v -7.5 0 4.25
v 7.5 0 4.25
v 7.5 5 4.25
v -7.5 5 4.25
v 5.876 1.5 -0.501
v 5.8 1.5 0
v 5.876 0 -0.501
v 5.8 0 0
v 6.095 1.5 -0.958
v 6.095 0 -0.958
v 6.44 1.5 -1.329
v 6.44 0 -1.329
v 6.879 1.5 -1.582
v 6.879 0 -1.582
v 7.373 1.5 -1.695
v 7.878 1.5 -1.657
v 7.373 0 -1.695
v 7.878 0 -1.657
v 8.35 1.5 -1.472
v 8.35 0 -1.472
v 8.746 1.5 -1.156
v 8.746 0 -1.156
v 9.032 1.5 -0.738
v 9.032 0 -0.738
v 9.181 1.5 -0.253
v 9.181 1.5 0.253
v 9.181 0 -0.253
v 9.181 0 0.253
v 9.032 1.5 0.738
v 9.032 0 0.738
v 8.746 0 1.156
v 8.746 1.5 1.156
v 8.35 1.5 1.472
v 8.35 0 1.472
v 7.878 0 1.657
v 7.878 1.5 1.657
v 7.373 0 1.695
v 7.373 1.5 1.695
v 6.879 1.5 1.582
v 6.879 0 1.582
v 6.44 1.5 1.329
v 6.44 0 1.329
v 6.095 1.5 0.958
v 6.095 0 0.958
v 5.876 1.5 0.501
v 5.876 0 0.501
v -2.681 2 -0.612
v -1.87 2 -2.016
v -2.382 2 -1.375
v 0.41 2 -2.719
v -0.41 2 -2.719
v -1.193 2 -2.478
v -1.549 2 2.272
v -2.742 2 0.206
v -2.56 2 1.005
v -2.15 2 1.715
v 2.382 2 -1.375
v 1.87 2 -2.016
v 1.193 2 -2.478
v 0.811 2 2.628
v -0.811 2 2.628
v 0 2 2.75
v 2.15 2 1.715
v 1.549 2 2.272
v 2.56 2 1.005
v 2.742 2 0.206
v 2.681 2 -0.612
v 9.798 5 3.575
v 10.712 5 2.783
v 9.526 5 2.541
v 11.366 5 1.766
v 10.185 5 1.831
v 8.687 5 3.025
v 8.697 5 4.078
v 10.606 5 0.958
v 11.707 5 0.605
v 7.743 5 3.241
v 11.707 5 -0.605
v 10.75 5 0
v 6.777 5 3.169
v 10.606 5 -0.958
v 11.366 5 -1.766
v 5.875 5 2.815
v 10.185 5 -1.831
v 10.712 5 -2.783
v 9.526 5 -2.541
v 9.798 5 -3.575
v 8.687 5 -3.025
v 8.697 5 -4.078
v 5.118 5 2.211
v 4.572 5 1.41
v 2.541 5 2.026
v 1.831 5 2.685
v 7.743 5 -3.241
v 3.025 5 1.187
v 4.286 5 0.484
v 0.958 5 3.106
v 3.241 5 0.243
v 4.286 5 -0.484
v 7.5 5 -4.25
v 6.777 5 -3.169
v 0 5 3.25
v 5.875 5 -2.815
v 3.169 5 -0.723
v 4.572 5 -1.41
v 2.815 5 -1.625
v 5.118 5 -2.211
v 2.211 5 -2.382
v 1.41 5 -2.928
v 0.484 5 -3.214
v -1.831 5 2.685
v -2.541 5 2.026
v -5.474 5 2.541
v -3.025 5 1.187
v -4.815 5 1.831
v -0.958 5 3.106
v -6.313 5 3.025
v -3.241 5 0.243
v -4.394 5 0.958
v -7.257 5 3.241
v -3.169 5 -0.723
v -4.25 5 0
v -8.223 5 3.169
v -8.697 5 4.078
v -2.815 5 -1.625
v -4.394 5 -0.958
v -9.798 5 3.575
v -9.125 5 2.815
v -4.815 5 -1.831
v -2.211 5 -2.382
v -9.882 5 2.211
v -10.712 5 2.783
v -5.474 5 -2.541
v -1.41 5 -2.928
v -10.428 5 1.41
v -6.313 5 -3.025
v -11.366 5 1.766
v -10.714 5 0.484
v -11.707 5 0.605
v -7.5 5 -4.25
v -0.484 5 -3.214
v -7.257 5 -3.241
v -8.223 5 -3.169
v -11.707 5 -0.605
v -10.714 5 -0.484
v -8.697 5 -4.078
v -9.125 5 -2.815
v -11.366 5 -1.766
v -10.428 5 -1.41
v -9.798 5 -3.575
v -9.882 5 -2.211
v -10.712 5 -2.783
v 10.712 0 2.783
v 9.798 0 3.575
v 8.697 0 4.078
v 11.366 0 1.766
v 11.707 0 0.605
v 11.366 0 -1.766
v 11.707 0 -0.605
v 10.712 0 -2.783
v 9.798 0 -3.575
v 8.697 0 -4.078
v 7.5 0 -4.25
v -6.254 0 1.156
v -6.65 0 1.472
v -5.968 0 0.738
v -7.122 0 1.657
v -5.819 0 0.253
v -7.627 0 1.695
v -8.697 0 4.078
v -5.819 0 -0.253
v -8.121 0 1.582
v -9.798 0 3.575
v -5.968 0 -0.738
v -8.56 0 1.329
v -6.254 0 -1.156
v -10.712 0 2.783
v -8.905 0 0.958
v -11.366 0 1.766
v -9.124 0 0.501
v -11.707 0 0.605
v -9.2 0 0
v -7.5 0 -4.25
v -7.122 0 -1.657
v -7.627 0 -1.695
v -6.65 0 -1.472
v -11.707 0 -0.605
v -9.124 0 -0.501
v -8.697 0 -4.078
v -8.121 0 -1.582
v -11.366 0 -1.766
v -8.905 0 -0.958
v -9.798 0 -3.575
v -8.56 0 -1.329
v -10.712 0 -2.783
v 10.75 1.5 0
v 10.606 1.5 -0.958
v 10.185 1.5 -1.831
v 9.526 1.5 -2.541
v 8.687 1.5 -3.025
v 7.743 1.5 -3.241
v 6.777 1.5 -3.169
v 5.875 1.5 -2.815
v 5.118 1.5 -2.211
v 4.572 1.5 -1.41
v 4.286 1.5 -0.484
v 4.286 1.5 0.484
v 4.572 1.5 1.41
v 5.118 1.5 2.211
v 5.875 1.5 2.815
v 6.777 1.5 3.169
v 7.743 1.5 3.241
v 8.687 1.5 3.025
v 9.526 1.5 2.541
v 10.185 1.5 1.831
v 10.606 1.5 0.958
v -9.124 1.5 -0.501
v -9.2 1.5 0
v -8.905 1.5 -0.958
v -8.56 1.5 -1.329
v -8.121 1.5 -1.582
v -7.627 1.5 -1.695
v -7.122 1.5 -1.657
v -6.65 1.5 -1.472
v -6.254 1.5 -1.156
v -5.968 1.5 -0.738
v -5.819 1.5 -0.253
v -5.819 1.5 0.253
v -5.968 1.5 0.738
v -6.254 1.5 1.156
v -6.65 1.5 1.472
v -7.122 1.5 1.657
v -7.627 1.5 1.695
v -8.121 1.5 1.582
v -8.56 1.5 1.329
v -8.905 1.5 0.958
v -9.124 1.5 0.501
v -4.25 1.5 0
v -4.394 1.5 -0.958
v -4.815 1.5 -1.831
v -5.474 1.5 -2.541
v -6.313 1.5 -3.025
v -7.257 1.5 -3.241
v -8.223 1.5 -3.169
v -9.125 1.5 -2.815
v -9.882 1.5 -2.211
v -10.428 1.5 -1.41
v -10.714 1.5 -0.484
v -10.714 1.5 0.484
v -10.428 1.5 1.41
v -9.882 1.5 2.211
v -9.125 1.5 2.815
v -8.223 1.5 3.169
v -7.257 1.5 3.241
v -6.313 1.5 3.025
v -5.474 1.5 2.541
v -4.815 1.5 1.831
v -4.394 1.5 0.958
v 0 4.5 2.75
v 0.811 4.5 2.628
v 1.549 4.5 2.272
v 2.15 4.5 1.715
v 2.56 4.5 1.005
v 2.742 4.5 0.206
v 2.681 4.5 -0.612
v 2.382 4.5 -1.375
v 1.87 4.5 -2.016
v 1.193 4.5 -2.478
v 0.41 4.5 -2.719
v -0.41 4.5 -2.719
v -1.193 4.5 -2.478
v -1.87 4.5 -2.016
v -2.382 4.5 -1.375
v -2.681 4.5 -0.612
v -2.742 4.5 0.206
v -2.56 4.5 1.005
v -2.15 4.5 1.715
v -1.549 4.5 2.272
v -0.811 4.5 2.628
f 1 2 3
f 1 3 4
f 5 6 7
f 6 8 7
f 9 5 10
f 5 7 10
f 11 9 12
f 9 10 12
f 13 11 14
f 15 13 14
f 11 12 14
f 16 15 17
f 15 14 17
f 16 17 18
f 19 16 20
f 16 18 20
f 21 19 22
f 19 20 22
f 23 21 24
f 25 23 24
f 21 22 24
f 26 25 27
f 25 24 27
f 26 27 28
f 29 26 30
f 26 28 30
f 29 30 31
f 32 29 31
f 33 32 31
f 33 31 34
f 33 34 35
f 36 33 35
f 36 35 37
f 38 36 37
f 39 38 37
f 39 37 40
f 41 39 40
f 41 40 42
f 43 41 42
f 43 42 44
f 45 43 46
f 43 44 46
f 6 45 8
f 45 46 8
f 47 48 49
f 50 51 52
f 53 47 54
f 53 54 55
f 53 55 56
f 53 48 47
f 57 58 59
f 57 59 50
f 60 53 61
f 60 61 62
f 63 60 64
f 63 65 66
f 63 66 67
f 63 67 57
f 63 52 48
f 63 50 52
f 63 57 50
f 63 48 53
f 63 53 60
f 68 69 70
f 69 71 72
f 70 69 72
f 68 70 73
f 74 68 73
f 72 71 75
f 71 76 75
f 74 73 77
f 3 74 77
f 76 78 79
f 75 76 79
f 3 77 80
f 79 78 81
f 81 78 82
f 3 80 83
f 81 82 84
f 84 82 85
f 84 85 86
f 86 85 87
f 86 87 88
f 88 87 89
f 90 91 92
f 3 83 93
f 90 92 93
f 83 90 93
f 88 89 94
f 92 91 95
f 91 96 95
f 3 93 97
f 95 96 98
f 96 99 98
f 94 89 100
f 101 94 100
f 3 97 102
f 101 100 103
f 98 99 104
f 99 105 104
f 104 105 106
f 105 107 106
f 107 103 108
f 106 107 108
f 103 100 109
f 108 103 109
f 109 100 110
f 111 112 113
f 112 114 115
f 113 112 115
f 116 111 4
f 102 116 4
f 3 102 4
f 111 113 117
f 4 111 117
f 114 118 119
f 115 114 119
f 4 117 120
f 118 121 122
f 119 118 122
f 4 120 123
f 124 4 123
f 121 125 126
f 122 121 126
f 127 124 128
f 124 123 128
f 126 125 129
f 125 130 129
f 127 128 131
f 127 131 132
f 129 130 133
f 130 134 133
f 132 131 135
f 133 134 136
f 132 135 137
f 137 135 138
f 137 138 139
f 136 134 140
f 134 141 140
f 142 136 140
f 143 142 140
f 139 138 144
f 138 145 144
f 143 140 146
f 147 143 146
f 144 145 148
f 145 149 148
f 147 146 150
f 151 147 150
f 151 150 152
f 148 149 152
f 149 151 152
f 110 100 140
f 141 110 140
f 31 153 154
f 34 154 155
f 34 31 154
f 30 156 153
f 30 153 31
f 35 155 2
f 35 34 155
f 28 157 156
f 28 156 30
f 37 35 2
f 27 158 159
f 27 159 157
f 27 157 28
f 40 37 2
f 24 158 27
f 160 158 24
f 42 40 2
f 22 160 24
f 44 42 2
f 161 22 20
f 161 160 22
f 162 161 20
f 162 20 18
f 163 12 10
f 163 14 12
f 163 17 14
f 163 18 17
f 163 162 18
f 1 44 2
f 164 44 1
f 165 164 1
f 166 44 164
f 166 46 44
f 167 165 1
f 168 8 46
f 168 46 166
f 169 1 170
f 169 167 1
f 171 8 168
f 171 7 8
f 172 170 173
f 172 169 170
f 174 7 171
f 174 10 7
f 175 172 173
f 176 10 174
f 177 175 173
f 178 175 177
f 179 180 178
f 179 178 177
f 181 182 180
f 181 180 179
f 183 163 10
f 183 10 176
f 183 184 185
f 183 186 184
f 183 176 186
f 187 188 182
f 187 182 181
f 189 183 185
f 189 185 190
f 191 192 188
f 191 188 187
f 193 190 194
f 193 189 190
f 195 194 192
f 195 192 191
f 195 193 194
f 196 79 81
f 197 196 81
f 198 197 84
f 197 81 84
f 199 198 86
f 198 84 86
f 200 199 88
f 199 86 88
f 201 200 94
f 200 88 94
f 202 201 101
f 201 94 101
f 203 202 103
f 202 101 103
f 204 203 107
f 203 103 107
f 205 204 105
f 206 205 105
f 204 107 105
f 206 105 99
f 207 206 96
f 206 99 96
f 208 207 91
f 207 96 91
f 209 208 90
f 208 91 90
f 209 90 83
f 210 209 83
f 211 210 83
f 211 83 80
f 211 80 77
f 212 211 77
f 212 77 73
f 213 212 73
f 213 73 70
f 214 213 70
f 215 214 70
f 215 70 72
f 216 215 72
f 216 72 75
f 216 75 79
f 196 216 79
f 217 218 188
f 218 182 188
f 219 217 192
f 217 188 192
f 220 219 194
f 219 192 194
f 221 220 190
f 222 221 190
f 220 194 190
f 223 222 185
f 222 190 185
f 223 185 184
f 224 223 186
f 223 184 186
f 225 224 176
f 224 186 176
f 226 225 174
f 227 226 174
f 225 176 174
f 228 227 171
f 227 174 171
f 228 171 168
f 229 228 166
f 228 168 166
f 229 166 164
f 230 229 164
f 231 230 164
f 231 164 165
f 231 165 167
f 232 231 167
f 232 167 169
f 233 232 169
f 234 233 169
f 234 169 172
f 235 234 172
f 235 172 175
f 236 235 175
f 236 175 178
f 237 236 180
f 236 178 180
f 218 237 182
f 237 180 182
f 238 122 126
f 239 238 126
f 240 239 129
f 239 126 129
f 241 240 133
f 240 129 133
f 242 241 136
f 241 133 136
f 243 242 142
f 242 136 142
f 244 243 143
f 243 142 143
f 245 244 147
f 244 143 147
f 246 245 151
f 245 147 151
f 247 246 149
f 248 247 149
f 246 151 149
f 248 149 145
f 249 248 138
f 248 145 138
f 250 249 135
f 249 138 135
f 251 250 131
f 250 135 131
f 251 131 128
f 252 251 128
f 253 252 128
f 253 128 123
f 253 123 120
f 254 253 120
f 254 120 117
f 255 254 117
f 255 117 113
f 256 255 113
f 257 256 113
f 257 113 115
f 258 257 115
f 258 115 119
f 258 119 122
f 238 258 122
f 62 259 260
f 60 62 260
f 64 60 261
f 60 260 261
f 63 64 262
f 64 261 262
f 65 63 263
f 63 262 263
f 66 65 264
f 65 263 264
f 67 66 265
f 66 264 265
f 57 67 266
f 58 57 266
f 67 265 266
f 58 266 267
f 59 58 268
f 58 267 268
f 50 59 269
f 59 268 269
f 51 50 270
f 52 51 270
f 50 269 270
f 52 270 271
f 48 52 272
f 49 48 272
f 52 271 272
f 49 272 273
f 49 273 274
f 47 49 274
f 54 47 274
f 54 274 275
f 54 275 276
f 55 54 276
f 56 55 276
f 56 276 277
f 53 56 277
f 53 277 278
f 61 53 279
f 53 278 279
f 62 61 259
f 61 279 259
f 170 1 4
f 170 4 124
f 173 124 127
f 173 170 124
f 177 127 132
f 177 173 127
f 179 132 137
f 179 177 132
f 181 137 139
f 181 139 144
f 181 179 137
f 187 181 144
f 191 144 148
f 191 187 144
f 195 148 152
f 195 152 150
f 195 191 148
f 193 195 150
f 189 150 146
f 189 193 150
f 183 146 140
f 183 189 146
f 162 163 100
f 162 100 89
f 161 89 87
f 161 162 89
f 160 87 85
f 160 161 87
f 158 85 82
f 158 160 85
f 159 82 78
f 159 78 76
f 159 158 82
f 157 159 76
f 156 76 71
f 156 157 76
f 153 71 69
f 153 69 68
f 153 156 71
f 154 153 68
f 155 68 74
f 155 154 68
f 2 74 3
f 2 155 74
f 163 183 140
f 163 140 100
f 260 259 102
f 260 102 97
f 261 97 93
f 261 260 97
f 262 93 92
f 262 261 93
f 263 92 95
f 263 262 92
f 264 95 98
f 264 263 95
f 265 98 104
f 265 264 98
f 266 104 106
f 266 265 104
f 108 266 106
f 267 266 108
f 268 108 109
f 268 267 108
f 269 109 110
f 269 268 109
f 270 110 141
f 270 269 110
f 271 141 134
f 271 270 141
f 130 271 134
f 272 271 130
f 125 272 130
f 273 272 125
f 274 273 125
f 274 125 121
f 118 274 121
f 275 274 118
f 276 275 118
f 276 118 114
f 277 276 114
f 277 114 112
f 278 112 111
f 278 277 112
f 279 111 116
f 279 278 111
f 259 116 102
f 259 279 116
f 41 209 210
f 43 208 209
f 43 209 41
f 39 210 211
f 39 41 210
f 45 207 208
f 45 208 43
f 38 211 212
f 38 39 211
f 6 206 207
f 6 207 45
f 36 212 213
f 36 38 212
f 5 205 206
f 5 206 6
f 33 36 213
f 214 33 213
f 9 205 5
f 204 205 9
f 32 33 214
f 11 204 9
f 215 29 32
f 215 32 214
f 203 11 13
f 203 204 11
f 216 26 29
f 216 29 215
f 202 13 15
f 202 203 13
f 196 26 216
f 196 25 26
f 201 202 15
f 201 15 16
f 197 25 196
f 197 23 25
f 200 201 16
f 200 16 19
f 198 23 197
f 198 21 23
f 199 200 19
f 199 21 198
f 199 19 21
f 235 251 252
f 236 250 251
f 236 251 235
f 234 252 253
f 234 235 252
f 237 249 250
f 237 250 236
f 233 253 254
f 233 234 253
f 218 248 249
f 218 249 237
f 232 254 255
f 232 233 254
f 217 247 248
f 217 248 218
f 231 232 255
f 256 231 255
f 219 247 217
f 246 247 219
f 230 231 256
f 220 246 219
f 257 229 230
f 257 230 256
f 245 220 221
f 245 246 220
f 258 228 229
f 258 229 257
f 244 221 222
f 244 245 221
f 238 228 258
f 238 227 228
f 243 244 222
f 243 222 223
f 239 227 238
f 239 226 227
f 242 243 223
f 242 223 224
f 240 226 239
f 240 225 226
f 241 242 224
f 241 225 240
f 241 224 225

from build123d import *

# Parameters (mm, degrees)
BOSS_EXTRUDE1_DEPTH                                 = 5
SKETCH2_R                                           = 2.75
CUT_EXTRUDE1_DEPTH                                  = 3
CBORE_FOR_M3_HEX_SOCKET_HEAD_CAP_SCREW1_D           = 3.4
CBORE_FOR_M3_HEX_SOCKET_HEAD_CAP_SCREW1_CBORE_D     = 6.5
CBORE_FOR_M3_HEX_SOCKET_HEAD_CAP_SCREW1_CBORE_DEPTH = 3.5
CHAMFER1_SIZE                                       = 0.5


with BuildPart() as part:
    # Sketch1 → Boss-Extrude1 (new body)
    with BuildSketch(Plane(origin=(0, 0, 0), x_dir=(1, 0, 0), z_dir=(0, 1, 0))):
        with BuildLine():
            Line((-7.5, 4.25), (7.5, 4.25))
            ThreePointArc((7.5, 4.25), (11.75, 0), (7.5, -4.25))
            Line((7.5, -4.25), (-7.5, -4.25))
            ThreePointArc((-7.5, -4.25), (-11.75, 0), (-7.5, 4.25))
        make_face()
    extrude(amount=BOSS_EXTRUDE1_DEPTH)

    # Sketch2 → Cut-Extrude1 (cut)
    with BuildSketch(Plane(origin=(0, 5, 0), x_dir=(1, 0, 0), z_dir=(0, 1, 0))):
        with Locations(Location((0, 0, 0), (0, 0, 270))):
            Circle(SKETCH2_R)
    extrude(amount=-CUT_EXTRUDE1_DEPTH, mode=Mode.SUBTRACT)

    # CBORE for M3 Hex Socket Head Cap Screw1 (through all)
    with Locations(Plane(origin=(0, 5, 0), x_dir=(1, 0, 0), z_dir=(0, 1, 0))):
        with Locations((-7.5, 0), (7.5, 0)):
            CounterBoreHole(CBORE_FOR_M3_HEX_SOCKET_HEAD_CAP_SCREW1_D / 2, CBORE_FOR_M3_HEX_SOCKET_HEAD_CAP_SCREW1_CBORE_D / 2, CBORE_FOR_M3_HEX_SOCKET_HEAD_CAP_SCREW1_CBORE_DEPTH)

    # Chamfer1
    chamfer1_edges = [part.edges().sort_by_distance(p)[0] for p in [
        (0, 5, -2.75),
    ]]
    chamfer(chamfer1_edges, length=CHAMFER1_SIZE)


solid = part.part
